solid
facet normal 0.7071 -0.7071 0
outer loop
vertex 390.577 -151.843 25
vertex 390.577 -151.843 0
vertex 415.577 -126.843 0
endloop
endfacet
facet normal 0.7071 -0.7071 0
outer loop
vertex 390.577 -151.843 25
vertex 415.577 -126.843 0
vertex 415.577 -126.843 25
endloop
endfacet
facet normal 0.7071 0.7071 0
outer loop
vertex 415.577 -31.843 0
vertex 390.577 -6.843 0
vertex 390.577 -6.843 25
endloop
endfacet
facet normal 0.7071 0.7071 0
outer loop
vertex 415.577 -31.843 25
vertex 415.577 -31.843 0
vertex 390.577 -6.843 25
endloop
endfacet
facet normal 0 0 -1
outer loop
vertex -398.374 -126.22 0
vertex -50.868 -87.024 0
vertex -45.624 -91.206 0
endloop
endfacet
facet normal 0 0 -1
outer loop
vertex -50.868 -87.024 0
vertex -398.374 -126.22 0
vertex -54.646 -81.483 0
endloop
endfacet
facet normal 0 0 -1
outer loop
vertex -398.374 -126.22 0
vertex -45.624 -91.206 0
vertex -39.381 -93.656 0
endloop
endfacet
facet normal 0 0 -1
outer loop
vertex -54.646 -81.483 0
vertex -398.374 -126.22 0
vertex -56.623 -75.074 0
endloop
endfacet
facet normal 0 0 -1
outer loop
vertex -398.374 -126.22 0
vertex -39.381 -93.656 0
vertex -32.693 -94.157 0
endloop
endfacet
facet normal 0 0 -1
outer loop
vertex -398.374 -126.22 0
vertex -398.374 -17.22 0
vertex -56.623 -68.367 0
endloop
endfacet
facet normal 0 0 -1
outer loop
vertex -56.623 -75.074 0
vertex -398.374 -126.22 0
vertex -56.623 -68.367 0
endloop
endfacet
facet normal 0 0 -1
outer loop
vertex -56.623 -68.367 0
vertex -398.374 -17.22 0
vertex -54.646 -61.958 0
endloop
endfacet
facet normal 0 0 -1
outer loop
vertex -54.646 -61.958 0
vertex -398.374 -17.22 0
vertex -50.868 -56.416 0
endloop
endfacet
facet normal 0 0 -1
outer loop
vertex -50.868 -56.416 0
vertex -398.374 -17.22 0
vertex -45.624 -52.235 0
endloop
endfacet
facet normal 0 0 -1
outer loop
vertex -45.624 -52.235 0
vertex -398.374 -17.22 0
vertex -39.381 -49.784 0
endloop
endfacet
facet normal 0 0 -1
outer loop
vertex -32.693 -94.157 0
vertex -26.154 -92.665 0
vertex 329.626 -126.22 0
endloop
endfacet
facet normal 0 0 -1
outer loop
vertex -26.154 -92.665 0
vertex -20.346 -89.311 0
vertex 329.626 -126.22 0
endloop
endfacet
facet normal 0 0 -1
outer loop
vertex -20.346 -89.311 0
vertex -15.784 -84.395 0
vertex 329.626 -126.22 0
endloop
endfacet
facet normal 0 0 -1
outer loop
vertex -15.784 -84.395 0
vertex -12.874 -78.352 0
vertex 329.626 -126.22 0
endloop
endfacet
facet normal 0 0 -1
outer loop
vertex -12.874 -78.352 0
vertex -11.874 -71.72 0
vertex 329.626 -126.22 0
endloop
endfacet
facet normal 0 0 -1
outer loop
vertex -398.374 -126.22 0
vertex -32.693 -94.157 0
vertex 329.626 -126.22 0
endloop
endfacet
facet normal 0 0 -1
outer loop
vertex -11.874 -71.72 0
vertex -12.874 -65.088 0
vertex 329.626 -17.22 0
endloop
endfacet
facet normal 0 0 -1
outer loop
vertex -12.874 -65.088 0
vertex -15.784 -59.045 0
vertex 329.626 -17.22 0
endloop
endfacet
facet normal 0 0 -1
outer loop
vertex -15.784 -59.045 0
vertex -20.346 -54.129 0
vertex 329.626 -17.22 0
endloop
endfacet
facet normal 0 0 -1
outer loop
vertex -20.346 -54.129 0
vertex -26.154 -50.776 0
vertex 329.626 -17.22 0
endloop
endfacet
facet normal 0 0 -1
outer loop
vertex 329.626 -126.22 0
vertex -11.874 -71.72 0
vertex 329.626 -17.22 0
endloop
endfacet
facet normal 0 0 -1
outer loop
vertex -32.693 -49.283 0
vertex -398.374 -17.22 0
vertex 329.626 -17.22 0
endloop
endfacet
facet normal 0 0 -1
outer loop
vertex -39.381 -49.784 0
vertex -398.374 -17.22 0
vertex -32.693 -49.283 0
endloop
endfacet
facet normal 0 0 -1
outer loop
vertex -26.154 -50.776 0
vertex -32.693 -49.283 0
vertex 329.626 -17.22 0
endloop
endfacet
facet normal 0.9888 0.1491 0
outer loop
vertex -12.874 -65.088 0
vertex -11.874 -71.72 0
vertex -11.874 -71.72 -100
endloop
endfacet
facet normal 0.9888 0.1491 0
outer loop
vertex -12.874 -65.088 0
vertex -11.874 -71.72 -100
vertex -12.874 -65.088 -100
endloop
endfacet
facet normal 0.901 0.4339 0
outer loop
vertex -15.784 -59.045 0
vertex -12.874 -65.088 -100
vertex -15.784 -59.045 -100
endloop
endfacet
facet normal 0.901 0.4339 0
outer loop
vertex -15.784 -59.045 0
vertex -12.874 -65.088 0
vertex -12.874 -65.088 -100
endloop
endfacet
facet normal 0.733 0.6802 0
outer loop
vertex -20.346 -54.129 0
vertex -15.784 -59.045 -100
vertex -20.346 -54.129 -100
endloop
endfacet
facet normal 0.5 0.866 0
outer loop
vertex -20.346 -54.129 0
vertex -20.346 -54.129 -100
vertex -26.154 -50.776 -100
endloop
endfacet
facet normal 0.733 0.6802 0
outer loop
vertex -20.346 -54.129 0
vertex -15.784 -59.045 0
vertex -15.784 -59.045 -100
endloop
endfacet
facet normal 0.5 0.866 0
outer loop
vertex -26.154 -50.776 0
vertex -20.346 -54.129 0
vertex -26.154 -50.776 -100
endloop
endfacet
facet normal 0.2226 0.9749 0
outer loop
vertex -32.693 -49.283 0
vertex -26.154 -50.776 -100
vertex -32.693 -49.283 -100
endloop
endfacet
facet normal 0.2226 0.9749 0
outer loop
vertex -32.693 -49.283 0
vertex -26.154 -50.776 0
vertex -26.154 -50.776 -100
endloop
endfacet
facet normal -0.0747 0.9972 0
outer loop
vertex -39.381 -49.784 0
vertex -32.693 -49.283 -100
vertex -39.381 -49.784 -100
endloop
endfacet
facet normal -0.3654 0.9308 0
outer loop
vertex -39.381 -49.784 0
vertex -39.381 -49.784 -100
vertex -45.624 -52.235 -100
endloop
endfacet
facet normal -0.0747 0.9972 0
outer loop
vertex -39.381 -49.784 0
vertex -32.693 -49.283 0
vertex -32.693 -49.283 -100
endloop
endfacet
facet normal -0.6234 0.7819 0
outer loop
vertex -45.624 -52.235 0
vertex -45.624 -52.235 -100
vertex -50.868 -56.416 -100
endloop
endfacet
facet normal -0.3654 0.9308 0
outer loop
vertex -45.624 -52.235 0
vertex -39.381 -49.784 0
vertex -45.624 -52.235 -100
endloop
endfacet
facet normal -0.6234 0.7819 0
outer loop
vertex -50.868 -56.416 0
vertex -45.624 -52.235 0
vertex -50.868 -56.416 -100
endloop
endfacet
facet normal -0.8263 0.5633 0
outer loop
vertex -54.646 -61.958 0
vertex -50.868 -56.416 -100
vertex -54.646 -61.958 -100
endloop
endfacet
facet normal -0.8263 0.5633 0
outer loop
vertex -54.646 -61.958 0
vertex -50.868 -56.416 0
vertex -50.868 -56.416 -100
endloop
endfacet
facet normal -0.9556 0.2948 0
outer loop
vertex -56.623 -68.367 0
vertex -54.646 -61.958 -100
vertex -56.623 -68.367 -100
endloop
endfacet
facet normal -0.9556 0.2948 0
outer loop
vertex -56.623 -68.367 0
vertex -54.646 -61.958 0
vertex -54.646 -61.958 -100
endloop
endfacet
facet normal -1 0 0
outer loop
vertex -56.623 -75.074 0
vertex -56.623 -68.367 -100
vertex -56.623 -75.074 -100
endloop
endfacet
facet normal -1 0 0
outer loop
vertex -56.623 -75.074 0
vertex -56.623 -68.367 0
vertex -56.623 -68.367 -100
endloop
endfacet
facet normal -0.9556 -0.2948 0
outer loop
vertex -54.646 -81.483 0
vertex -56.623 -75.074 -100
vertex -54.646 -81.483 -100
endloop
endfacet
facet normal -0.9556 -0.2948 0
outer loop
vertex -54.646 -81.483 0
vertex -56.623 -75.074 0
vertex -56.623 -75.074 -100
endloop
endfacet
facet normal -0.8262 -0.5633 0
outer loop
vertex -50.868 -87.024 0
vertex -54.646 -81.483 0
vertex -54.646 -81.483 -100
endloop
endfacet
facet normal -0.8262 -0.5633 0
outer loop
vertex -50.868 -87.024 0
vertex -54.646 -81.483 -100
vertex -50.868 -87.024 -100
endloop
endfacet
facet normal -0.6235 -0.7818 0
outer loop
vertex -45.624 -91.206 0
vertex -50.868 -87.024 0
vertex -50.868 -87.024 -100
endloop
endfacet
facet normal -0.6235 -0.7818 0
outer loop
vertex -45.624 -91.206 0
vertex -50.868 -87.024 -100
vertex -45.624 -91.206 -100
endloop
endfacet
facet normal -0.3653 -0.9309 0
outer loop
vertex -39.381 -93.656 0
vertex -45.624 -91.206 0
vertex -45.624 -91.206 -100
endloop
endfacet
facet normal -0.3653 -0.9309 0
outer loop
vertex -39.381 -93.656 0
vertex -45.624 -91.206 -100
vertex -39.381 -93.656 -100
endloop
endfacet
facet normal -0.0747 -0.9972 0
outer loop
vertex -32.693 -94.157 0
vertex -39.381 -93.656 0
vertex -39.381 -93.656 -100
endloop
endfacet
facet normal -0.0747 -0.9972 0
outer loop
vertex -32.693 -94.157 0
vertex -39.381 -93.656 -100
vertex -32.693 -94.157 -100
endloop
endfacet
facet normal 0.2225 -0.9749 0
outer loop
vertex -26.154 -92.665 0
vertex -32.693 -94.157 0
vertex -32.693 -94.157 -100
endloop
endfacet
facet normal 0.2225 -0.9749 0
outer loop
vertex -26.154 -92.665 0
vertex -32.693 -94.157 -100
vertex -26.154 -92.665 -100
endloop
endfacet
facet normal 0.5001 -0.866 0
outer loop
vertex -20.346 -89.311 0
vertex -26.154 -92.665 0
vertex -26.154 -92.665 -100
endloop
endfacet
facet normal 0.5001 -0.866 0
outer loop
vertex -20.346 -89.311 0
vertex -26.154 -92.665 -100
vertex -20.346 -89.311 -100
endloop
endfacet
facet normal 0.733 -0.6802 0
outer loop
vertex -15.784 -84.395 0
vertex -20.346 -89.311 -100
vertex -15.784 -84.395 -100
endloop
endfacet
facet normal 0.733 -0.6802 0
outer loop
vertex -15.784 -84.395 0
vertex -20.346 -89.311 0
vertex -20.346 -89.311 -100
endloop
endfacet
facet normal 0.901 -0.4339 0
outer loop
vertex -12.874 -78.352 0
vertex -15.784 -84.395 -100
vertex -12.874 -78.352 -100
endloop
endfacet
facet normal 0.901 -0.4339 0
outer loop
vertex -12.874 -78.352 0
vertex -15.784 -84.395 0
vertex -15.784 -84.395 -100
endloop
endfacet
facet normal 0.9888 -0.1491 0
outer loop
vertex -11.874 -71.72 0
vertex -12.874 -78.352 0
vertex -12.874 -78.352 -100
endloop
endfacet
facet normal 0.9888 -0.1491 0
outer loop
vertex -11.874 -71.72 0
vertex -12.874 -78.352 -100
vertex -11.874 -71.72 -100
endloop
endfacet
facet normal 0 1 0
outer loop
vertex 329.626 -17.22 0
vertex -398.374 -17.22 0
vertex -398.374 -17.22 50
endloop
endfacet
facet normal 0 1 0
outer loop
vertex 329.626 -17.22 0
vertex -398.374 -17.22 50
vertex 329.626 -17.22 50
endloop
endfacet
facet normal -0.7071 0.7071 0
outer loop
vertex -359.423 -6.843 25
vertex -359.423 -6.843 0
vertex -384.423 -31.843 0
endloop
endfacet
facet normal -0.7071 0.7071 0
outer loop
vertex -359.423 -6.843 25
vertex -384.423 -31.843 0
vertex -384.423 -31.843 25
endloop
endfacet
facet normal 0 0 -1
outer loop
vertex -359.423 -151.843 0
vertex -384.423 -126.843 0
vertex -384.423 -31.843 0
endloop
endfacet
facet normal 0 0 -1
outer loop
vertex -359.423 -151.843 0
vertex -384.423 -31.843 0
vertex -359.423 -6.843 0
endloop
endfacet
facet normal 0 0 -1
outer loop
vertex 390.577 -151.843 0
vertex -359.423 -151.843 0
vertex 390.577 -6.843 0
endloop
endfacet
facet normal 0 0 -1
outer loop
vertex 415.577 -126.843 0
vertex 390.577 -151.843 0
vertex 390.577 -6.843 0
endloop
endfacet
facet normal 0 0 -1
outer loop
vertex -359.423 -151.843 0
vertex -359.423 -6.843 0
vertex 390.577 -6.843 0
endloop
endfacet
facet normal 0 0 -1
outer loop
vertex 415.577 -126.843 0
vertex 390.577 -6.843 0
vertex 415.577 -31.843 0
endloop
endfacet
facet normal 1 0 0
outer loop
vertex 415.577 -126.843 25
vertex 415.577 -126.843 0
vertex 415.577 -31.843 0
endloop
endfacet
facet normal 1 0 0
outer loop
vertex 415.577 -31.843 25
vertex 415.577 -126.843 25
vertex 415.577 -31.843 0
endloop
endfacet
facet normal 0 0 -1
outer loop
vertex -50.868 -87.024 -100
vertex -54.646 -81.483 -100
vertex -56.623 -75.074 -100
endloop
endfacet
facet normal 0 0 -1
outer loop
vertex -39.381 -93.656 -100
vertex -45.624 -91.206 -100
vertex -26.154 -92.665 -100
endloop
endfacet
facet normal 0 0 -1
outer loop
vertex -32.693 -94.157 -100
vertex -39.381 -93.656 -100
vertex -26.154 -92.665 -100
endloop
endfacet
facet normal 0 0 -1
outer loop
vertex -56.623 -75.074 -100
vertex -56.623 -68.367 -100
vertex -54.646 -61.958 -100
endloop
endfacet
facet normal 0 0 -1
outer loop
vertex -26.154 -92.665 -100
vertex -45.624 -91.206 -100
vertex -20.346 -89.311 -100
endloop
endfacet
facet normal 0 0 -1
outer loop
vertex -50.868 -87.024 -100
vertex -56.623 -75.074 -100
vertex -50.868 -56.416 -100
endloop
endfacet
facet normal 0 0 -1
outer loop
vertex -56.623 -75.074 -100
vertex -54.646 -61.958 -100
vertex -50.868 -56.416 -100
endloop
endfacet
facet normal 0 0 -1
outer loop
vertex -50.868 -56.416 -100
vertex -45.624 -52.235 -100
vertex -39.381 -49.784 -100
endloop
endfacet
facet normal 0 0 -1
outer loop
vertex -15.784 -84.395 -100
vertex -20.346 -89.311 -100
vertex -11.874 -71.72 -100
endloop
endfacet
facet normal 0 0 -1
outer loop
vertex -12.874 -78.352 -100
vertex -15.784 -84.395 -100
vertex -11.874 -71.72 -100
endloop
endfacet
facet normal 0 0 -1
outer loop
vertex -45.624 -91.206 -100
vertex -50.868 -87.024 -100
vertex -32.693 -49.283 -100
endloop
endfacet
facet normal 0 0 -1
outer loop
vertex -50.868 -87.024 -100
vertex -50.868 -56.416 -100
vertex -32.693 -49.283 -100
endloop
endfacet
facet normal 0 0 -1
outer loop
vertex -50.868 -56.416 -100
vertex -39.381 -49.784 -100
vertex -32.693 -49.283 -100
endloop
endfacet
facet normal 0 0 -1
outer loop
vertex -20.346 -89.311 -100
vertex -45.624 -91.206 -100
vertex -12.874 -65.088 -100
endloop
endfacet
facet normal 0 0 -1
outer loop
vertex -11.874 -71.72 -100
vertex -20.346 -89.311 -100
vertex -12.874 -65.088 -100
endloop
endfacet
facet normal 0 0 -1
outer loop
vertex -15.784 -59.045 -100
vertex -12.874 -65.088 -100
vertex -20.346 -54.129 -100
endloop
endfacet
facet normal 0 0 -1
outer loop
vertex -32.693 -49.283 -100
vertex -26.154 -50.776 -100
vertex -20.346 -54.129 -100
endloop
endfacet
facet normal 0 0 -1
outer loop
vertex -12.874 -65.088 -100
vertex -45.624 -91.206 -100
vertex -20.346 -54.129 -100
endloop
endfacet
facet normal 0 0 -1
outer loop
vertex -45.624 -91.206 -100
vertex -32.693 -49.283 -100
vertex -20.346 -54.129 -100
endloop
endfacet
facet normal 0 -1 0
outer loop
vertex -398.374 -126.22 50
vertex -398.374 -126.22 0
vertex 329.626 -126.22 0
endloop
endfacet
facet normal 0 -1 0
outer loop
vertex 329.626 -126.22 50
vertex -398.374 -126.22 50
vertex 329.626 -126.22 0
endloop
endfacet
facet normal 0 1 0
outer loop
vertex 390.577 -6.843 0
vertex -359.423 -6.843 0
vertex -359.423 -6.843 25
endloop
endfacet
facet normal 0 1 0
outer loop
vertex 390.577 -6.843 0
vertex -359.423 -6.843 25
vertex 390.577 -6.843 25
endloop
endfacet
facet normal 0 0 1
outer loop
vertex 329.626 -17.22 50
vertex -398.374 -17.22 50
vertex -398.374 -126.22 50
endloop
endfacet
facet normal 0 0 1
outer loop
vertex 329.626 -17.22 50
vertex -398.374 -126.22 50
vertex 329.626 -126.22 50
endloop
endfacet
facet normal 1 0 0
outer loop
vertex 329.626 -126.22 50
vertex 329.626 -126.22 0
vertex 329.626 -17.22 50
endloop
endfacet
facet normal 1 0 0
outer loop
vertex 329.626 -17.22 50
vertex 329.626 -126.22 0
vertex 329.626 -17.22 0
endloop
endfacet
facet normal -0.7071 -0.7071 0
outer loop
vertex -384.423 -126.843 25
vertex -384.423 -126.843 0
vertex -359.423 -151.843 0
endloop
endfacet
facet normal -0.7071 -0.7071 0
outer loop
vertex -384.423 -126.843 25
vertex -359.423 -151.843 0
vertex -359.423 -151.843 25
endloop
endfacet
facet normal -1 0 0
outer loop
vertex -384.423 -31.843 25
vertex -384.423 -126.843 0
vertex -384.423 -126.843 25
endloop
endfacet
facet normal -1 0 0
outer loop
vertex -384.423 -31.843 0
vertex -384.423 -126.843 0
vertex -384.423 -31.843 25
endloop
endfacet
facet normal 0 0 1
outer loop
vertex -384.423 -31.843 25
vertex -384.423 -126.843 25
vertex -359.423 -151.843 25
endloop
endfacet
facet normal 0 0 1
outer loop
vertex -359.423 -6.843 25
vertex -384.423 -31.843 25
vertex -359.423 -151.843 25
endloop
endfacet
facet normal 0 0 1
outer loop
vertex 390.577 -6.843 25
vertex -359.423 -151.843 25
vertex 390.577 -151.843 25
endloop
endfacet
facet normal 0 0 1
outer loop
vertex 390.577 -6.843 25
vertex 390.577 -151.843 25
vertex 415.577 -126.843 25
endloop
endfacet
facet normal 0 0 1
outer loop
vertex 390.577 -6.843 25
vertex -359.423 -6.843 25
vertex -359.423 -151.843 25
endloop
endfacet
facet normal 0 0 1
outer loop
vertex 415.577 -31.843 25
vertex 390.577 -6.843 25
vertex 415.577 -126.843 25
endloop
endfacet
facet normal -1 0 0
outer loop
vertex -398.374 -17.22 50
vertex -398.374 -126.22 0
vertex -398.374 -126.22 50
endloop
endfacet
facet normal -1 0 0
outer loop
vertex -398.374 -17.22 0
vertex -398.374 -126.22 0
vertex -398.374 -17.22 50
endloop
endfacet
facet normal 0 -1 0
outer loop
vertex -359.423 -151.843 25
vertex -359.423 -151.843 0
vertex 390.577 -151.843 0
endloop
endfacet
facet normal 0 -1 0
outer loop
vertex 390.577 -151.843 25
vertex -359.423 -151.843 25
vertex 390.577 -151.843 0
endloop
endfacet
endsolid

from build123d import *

# Parameters (mm, degrees)
F1_W     = 728
F1_H     = 109
F1_R     = 22.5
F2_DEPTH = 50
F3_DEPTH = 100
F0_W     = 800
F0_H     = 145
F4_DEPTH = 25
F5_SIZE  = 25


with BuildPart() as f2:
    # F1 (on Top) → F2 (new body)
    with BuildSketch(Plane.XY):
        with Locations((-34.374312, -71.720165)):
            Rectangle(F1_W, F1_H)
        with Locations((-34.374312, -71.720165)):
            Circle(F1_R, mode=Mode.SUBTRACT)
        with Locations((-34.374312, -71.720165)):
            Circle(F1_R)
    extrude(amount=F2_DEPTH)

    # F1 (on Top) → F3 (join)
    with BuildSketch(Plane.XY):
        with Locations((-34.374312, -71.720165)):
            Circle(F1_R)
    extrude(amount=-F3_DEPTH)


with BuildPart() as f4:
    # F0 (on Top) → F4 (new body)
    with BuildSketch(Plane.XY):
        with Locations((15.577245, -79.343417)):
            Rectangle(F0_W, F0_H)
    extrude(amount=F4_DEPTH)

    # F5
    f5_edges = [f4.edges().sort_by_distance(p)[0] for p in [
        (415.577245, -6.843417, 12.5),
        (415.577245, -151.843417, 12.5),
        (-384.422755, -6.843417, 12.5),
        (-384.422755, -151.843417, 12.5),
    ]]
    chamfer(f5_edges, length=F5_SIZE)


solid = Compound([f2.part, f4.part])
